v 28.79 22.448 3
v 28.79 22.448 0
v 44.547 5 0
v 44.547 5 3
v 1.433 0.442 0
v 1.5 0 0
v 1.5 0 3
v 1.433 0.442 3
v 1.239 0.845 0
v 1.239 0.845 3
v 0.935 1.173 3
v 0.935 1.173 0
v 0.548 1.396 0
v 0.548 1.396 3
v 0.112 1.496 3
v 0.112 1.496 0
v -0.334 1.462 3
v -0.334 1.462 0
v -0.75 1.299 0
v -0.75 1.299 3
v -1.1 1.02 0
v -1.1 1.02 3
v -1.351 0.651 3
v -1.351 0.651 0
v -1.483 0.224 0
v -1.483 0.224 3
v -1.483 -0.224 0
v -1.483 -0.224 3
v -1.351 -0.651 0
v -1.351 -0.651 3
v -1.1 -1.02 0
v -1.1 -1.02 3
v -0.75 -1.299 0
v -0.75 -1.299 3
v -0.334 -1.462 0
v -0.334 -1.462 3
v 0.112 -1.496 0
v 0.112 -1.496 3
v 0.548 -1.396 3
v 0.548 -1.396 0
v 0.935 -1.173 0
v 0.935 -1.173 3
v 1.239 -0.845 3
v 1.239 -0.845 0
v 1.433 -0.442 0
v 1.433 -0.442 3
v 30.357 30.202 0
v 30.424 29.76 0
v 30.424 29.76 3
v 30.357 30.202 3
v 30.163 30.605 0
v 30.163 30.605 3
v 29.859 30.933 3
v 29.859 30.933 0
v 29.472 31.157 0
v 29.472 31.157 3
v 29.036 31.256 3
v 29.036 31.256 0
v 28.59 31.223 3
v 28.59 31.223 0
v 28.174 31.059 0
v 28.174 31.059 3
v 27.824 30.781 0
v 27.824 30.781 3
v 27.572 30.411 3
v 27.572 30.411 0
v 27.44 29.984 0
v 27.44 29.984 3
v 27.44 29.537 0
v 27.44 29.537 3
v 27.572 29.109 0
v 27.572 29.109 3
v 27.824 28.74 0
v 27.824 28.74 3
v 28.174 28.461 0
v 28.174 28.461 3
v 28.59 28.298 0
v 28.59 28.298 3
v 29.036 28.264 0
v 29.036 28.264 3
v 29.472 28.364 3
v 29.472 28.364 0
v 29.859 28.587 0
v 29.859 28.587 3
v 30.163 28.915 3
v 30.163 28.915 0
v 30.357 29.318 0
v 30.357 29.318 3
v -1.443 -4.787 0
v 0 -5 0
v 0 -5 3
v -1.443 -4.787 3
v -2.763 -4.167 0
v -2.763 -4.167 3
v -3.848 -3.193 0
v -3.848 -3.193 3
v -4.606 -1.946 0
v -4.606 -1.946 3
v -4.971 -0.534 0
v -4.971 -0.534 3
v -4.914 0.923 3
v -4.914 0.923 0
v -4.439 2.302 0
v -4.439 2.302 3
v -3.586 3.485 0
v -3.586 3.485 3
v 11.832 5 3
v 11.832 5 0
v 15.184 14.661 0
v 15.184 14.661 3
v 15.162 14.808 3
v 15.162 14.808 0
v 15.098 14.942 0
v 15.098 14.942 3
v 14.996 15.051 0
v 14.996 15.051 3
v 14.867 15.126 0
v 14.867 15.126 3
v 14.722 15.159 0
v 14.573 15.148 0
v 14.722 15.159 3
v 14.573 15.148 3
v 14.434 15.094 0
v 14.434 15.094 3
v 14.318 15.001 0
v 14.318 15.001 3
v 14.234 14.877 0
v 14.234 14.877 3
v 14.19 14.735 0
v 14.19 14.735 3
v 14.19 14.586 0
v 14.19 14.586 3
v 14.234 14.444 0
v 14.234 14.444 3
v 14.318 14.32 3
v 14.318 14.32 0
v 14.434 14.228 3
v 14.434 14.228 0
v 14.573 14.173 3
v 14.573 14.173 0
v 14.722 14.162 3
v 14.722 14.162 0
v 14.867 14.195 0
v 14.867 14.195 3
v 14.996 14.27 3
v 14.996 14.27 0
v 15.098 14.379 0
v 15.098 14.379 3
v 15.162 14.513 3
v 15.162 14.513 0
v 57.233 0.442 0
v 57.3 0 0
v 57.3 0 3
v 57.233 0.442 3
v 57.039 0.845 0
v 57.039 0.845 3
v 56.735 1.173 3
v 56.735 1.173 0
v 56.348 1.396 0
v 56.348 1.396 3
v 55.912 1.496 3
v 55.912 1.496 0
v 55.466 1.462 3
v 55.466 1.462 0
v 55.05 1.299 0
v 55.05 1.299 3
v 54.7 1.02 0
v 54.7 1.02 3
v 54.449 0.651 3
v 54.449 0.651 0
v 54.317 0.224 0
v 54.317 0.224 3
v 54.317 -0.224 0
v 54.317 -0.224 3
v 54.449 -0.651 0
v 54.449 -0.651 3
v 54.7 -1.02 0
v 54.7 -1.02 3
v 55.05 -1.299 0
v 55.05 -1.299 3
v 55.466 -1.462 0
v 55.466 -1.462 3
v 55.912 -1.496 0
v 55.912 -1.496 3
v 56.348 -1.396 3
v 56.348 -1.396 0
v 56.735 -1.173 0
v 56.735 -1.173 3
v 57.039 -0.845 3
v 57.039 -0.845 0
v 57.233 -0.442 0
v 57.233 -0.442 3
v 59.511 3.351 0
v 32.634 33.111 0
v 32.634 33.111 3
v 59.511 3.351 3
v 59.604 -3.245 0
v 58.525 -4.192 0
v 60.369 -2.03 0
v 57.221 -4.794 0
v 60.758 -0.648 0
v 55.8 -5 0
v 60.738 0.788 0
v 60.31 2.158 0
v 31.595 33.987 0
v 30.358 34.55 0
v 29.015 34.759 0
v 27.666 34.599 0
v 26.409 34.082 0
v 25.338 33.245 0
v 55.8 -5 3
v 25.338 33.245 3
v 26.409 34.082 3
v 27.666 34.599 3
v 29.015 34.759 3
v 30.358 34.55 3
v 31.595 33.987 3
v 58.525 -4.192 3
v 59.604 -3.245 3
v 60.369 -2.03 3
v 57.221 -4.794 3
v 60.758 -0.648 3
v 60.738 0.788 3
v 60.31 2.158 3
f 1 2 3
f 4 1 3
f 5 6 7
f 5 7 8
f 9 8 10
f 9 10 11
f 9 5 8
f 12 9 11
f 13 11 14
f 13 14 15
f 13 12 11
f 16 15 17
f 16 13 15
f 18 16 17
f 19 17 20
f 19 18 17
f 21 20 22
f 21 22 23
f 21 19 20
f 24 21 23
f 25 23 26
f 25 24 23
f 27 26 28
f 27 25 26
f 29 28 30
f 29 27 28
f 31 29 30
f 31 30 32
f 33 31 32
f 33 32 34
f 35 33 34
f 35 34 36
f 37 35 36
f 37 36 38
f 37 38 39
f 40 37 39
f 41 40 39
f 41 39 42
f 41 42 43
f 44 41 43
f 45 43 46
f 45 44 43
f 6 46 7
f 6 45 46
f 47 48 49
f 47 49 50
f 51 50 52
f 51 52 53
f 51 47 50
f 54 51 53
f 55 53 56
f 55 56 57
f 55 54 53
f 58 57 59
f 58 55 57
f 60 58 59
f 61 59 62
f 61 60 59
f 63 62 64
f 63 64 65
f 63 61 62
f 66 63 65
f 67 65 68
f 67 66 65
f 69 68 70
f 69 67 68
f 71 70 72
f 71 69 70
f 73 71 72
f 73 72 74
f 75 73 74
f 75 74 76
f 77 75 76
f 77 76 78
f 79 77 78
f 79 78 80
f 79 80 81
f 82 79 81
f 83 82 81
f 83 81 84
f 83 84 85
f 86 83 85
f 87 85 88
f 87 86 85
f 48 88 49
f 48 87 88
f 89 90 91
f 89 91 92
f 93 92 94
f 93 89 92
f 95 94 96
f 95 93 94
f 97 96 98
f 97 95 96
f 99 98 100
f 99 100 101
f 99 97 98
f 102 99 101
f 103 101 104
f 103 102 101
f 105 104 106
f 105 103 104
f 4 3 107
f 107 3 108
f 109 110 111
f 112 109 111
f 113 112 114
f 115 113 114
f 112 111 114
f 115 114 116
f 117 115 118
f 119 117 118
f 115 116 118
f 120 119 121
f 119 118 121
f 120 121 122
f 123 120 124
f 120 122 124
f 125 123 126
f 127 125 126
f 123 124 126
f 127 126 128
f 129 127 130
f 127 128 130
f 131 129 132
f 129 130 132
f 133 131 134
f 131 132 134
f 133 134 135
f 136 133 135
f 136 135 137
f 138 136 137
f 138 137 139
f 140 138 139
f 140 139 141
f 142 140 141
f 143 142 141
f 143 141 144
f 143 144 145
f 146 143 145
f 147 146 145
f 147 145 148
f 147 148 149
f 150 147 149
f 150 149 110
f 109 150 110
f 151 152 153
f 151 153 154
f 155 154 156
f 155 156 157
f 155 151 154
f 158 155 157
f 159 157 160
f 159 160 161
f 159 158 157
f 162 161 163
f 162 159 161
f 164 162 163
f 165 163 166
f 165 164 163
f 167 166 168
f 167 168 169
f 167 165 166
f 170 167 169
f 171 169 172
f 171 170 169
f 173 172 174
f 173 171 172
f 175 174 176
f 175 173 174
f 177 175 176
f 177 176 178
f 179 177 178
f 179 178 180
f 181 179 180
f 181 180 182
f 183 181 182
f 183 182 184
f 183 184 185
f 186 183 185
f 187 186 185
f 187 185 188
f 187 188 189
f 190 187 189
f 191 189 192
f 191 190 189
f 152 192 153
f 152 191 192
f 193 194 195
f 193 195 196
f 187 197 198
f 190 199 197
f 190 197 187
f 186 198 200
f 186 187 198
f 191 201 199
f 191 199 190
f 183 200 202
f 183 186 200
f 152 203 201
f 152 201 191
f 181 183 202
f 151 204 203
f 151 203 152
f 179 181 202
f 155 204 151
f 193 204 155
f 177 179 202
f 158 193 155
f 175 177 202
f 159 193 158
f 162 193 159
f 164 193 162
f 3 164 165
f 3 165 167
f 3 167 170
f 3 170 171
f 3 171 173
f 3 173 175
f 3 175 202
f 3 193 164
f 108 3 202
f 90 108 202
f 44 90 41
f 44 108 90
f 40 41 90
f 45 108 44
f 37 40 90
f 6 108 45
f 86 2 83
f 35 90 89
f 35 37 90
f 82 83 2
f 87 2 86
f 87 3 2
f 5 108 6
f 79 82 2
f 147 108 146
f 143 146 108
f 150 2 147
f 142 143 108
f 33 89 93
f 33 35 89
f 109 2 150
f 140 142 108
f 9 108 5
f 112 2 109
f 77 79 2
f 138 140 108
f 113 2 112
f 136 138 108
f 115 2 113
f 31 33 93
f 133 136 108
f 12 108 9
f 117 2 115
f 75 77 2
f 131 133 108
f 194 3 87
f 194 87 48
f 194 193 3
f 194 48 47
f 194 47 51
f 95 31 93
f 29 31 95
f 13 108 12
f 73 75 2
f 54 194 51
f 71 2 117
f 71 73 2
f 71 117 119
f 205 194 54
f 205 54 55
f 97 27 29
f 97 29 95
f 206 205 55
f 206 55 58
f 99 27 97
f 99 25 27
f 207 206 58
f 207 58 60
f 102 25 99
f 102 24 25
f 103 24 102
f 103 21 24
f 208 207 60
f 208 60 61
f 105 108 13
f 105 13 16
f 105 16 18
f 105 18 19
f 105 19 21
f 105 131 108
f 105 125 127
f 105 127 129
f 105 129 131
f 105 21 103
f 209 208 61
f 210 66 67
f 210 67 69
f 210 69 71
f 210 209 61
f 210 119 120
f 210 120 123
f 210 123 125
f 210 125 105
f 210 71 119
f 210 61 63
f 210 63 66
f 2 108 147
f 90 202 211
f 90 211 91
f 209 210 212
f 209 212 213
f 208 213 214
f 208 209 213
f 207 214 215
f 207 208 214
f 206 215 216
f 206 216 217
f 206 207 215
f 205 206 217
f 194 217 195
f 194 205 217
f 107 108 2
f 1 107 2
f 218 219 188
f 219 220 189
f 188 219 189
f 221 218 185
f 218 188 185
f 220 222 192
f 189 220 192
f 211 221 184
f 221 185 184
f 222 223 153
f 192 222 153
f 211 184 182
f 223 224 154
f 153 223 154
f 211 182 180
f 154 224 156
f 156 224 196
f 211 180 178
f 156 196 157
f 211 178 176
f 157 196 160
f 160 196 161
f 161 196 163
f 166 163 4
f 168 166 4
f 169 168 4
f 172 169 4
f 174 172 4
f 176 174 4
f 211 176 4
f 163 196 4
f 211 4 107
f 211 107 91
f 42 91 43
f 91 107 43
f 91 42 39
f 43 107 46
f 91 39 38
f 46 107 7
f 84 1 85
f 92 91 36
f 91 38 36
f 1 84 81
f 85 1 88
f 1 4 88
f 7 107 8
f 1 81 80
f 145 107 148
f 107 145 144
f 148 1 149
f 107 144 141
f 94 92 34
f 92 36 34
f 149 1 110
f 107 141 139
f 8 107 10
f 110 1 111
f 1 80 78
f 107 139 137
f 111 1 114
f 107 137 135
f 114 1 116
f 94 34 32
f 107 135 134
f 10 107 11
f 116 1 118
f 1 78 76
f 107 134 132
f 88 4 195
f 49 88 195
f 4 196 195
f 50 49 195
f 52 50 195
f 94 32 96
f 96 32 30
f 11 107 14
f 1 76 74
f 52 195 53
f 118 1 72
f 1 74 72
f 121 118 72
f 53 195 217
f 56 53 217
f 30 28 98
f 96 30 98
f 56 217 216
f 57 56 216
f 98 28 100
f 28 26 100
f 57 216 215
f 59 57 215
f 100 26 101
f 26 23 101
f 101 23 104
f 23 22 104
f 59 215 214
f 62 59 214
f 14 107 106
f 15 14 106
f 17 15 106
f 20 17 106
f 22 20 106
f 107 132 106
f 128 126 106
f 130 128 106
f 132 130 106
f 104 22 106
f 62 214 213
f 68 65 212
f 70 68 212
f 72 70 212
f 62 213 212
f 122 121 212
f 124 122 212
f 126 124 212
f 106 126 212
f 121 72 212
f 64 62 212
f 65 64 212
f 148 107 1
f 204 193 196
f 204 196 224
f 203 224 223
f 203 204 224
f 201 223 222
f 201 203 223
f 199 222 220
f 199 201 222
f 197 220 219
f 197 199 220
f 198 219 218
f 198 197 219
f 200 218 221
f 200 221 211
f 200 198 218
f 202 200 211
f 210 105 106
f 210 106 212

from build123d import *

# Parameters (mm, degrees)
SKETCH1_R           = 1.5
BOSS_EXTRUDE1_DEPTH = 3
SKETCH2_R           = 0.5
CUT_EXTRUDE1_DEPTH  = 71.099319323


with BuildPart() as part:
    # Sketch1 → Boss-Extrude1 (new body)
    with BuildSketch(Plane.XY):
        with BuildLine():
            Line((-3.585571578, 3.484777821), (25.338084336, 33.245021916))
            ThreePointArc((25.338084336, 33.245021916), (29.015202221, 34.759405952), (32.634409542, 33.111409193))
            Line((32.634409542, 33.111409193), (59.510753628, 3.351165098))
            ThreePointArc((59.510753628, 3.351165098), (60.369235466, -2.030292406), (55.8, -5))
            Line((55.8, -5), (0, -5))
            ThreePointArc((0, -5), (-4.605642686, -1.946292745), (-3.585571578, 3.484777821))
        make_face()
        with Locations((28.923655914, 29.760244095)):
            Circle(SKETCH1_R, mode=Mode.SUBTRACT)
        Circle(SKETCH1_R, mode=Mode.SUBTRACT)
        with Locations((55.8, 0)):
            Circle(SKETCH1_R, mode=Mode.SUBTRACT)
        Polygon((11.831834391, 5), (28.7897593, 22.448416138), (44.547346313, 5), align=None, mode=Mode.SUBTRACT)
    extrude(amount=BOSS_EXTRUDE1_DEPTH)

    # Sketch2 → Cut-Extrude1 (cut, through all)
    with BuildSketch(Plane.XY.offset(3)):
        with Locations((14.684404162, 14.660517535)):
            Circle(SKETCH2_R)
    extrude(amount=-CUT_EXTRUDE1_DEPTH, mode=Mode.SUBTRACT)


solid = part.part
